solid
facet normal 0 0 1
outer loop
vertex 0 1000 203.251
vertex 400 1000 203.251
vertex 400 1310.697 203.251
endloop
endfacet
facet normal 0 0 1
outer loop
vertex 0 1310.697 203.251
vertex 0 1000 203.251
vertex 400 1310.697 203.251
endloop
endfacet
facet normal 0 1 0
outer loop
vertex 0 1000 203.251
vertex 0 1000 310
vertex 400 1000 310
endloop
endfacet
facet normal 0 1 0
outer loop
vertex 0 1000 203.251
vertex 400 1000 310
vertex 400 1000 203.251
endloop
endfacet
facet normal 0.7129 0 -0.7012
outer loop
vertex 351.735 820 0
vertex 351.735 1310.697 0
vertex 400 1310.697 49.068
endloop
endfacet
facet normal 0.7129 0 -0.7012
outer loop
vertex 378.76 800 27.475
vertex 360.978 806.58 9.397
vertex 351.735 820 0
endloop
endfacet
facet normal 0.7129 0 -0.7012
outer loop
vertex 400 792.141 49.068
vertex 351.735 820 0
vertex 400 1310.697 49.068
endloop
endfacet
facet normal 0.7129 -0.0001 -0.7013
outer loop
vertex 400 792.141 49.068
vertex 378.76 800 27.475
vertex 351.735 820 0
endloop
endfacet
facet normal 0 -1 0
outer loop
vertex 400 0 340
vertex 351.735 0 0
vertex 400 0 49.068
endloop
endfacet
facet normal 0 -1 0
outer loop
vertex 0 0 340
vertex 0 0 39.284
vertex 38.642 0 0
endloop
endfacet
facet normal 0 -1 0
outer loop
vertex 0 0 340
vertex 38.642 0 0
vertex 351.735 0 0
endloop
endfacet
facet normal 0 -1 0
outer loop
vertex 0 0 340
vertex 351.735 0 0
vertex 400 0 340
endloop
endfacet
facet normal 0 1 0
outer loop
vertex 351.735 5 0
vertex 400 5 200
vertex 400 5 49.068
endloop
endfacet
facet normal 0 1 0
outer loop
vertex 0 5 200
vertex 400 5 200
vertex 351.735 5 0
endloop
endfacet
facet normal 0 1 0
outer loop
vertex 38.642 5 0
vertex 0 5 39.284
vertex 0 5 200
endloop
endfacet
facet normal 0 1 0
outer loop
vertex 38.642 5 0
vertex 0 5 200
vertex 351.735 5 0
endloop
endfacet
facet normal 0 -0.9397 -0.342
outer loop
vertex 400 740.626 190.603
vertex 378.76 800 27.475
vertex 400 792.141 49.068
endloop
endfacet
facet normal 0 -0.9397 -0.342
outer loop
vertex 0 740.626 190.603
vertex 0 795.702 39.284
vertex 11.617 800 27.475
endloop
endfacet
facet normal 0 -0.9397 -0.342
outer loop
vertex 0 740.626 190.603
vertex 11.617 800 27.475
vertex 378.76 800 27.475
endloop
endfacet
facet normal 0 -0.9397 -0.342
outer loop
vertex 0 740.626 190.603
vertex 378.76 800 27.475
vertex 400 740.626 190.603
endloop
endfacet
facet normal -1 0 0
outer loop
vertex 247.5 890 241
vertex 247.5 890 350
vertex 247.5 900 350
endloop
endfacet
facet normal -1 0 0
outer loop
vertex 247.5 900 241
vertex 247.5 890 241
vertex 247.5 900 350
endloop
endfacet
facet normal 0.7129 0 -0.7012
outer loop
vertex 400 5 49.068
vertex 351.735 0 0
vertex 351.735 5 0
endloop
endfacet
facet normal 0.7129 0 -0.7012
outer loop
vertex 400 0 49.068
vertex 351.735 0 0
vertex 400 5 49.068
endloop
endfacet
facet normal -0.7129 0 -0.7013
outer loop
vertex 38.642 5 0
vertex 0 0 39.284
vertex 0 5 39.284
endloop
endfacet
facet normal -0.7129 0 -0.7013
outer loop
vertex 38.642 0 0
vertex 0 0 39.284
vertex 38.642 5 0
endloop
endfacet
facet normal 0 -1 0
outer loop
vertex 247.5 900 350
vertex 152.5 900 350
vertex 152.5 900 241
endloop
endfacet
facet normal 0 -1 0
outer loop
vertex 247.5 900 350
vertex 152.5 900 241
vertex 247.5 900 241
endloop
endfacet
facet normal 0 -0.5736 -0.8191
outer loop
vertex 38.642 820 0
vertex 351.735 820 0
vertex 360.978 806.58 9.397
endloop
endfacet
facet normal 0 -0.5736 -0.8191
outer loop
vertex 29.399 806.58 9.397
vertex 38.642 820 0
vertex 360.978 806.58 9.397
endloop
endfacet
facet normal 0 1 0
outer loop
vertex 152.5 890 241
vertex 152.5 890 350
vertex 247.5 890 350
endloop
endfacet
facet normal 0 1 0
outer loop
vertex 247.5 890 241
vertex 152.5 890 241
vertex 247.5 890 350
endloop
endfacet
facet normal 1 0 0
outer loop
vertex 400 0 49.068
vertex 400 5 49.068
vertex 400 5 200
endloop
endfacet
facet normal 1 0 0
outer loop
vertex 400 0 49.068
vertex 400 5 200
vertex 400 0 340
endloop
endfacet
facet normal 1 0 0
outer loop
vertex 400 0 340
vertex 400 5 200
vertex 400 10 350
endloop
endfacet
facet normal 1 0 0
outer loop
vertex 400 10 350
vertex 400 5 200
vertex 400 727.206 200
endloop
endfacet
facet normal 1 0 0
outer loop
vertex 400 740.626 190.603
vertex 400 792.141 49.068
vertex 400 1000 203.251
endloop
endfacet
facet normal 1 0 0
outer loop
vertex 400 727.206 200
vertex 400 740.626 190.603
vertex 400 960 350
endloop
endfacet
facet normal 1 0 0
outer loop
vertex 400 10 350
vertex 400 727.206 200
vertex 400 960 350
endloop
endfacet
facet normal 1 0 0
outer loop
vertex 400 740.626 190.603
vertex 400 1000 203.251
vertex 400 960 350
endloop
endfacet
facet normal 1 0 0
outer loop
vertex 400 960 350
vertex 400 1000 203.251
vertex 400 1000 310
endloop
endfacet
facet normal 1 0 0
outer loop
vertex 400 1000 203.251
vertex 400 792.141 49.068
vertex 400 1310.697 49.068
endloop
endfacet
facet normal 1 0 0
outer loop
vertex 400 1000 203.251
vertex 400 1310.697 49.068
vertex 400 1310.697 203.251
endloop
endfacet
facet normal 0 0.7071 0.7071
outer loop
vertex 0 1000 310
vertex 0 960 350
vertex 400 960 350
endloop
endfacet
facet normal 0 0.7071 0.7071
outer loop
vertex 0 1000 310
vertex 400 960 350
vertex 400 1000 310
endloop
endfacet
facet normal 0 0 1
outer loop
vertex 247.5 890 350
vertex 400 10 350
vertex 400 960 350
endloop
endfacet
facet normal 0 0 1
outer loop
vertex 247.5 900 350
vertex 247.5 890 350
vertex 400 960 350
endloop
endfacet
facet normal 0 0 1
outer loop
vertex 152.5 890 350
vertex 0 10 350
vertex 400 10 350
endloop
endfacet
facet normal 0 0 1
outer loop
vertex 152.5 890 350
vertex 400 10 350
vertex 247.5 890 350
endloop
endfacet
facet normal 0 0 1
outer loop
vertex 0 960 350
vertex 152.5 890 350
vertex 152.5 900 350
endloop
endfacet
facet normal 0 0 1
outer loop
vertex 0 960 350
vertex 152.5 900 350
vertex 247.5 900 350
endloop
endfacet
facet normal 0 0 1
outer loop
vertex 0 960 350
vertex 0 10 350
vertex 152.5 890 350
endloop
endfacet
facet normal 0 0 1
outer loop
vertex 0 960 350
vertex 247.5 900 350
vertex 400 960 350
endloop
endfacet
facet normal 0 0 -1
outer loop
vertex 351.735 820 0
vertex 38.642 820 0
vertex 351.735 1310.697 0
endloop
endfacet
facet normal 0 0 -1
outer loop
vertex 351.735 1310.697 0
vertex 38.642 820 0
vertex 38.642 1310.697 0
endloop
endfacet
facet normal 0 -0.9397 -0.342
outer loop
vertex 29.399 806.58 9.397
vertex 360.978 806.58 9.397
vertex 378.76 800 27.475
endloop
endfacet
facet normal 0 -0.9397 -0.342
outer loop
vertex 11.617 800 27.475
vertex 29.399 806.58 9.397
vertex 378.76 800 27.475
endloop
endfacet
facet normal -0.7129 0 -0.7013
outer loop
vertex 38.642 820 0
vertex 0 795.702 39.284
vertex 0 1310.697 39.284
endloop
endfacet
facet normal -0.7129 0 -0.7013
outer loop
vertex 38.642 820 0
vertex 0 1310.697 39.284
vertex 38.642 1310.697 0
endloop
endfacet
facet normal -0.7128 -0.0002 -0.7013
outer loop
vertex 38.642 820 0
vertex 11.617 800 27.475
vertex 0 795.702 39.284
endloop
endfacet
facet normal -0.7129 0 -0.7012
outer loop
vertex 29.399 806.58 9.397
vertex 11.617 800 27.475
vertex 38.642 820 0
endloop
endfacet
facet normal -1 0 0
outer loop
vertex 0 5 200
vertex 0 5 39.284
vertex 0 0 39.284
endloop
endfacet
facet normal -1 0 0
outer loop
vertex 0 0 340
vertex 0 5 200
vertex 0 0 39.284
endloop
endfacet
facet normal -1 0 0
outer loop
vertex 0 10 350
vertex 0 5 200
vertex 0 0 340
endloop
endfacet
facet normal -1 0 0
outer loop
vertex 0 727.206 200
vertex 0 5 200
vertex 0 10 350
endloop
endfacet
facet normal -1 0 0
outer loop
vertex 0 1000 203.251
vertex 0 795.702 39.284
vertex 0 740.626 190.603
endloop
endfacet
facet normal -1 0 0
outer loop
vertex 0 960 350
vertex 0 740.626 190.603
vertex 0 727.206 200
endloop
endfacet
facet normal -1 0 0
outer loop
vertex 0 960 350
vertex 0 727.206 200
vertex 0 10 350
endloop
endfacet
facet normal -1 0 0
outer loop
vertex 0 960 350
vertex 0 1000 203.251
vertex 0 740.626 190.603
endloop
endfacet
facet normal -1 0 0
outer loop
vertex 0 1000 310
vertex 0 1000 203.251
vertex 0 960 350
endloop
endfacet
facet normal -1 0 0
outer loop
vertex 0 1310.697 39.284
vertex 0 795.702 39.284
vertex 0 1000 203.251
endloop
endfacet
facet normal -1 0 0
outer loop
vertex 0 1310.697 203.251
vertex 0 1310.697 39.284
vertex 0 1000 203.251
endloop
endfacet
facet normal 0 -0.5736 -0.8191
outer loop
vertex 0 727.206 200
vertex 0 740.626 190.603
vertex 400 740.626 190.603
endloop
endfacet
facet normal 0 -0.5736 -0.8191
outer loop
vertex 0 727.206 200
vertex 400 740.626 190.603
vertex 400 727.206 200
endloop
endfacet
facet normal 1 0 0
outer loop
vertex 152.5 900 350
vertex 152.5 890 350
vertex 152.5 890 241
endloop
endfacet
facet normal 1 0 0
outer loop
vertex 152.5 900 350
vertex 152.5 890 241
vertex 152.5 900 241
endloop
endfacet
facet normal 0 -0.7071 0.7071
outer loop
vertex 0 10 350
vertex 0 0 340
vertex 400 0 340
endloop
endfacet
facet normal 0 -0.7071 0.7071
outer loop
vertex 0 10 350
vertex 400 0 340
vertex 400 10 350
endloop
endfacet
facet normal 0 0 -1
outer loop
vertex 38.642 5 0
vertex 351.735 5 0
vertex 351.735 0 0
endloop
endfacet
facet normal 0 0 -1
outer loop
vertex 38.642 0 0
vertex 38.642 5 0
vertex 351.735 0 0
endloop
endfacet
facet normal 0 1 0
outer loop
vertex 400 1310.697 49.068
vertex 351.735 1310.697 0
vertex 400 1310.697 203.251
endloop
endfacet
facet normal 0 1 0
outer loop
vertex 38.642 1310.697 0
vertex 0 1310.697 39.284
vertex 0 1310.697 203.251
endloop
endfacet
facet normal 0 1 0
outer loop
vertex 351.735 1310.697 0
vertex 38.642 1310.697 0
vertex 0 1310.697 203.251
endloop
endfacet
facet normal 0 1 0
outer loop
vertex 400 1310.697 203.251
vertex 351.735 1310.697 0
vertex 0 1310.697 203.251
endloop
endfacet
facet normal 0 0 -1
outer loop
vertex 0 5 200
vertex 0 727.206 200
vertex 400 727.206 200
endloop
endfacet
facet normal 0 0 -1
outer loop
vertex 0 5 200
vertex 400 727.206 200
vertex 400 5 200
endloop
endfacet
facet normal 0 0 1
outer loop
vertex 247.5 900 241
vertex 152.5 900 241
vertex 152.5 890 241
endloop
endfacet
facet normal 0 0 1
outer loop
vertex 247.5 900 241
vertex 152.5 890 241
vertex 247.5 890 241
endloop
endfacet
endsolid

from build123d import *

# Parameters (mm, degrees)
BOSS_EXTRUDE1_DEPTH     = 400
CUT_EXTRUDE2_DEPTH      = 1
CUT_EXTRUDE2_DEPTH_BACK = 1311.69690242
SKETCH4_W               = 95
SKETCH4_H               = 10
CUT_EXTRUDE3_DEPTH      = 109


with BuildPart() as part:
    # Sketch1 → Boss-Extrude1 (new body)
    with BuildSketch(Plane(origin=(0, 0, 0), x_dir=(0, 0, -1), z_dir=(1, 0, 0))):
        Polygon((0, 0), (-340, 0), (-350, 10), (-350, 960), (-310, 1000), (-203.251091608, 1000), (-203.251091608, 1310.69690242), (-108.48888922, 1310.69690242), (0, 1310.69690242), (0, 1000), (0, 970), (0, 820), (-9.396926208, 806.579798567), (-27.474774195, 800), (-190.603073792, 740.62615458), (-200, 727.205953147), (-200, 5), (0, 5), align=None)
    extrude(amount=BOSS_EXTRUDE1_DEPTH)

    # Sketch3 → Cut-Extrude2 (cut, two sides)
    with BuildSketch(Plane(origin=(0, 0, 0), x_dir=(-1, 0, 0), z_dir=(0, -1, 0))) as cut_extrude2_sk:
        Polygon((32.971910004, -72.804395349), (-67.728153305, 29.569560354), (-322.648629759, 29.569560354), (-423.348693067, -72.804395349), (-423.348693067, 100.069531779), (32.971910004, 100.069531779), align=None)
    extrude(amount=CUT_EXTRUDE2_DEPTH, mode=Mode.SUBTRACT)
    extrude(cut_extrude2_sk.sketch, amount=-CUT_EXTRUDE2_DEPTH_BACK, mode=Mode.SUBTRACT)

    # Sketch4 → Cut-Extrude3 (cut)
    with BuildSketch(Plane.XY.offset(350)):
        with Locations((200, 895)):
            Rectangle(SKETCH4_W, SKETCH4_H)
    extrude(amount=-CUT_EXTRUDE3_DEPTH, mode=Mode.SUBTRACT)


solid = part.part
